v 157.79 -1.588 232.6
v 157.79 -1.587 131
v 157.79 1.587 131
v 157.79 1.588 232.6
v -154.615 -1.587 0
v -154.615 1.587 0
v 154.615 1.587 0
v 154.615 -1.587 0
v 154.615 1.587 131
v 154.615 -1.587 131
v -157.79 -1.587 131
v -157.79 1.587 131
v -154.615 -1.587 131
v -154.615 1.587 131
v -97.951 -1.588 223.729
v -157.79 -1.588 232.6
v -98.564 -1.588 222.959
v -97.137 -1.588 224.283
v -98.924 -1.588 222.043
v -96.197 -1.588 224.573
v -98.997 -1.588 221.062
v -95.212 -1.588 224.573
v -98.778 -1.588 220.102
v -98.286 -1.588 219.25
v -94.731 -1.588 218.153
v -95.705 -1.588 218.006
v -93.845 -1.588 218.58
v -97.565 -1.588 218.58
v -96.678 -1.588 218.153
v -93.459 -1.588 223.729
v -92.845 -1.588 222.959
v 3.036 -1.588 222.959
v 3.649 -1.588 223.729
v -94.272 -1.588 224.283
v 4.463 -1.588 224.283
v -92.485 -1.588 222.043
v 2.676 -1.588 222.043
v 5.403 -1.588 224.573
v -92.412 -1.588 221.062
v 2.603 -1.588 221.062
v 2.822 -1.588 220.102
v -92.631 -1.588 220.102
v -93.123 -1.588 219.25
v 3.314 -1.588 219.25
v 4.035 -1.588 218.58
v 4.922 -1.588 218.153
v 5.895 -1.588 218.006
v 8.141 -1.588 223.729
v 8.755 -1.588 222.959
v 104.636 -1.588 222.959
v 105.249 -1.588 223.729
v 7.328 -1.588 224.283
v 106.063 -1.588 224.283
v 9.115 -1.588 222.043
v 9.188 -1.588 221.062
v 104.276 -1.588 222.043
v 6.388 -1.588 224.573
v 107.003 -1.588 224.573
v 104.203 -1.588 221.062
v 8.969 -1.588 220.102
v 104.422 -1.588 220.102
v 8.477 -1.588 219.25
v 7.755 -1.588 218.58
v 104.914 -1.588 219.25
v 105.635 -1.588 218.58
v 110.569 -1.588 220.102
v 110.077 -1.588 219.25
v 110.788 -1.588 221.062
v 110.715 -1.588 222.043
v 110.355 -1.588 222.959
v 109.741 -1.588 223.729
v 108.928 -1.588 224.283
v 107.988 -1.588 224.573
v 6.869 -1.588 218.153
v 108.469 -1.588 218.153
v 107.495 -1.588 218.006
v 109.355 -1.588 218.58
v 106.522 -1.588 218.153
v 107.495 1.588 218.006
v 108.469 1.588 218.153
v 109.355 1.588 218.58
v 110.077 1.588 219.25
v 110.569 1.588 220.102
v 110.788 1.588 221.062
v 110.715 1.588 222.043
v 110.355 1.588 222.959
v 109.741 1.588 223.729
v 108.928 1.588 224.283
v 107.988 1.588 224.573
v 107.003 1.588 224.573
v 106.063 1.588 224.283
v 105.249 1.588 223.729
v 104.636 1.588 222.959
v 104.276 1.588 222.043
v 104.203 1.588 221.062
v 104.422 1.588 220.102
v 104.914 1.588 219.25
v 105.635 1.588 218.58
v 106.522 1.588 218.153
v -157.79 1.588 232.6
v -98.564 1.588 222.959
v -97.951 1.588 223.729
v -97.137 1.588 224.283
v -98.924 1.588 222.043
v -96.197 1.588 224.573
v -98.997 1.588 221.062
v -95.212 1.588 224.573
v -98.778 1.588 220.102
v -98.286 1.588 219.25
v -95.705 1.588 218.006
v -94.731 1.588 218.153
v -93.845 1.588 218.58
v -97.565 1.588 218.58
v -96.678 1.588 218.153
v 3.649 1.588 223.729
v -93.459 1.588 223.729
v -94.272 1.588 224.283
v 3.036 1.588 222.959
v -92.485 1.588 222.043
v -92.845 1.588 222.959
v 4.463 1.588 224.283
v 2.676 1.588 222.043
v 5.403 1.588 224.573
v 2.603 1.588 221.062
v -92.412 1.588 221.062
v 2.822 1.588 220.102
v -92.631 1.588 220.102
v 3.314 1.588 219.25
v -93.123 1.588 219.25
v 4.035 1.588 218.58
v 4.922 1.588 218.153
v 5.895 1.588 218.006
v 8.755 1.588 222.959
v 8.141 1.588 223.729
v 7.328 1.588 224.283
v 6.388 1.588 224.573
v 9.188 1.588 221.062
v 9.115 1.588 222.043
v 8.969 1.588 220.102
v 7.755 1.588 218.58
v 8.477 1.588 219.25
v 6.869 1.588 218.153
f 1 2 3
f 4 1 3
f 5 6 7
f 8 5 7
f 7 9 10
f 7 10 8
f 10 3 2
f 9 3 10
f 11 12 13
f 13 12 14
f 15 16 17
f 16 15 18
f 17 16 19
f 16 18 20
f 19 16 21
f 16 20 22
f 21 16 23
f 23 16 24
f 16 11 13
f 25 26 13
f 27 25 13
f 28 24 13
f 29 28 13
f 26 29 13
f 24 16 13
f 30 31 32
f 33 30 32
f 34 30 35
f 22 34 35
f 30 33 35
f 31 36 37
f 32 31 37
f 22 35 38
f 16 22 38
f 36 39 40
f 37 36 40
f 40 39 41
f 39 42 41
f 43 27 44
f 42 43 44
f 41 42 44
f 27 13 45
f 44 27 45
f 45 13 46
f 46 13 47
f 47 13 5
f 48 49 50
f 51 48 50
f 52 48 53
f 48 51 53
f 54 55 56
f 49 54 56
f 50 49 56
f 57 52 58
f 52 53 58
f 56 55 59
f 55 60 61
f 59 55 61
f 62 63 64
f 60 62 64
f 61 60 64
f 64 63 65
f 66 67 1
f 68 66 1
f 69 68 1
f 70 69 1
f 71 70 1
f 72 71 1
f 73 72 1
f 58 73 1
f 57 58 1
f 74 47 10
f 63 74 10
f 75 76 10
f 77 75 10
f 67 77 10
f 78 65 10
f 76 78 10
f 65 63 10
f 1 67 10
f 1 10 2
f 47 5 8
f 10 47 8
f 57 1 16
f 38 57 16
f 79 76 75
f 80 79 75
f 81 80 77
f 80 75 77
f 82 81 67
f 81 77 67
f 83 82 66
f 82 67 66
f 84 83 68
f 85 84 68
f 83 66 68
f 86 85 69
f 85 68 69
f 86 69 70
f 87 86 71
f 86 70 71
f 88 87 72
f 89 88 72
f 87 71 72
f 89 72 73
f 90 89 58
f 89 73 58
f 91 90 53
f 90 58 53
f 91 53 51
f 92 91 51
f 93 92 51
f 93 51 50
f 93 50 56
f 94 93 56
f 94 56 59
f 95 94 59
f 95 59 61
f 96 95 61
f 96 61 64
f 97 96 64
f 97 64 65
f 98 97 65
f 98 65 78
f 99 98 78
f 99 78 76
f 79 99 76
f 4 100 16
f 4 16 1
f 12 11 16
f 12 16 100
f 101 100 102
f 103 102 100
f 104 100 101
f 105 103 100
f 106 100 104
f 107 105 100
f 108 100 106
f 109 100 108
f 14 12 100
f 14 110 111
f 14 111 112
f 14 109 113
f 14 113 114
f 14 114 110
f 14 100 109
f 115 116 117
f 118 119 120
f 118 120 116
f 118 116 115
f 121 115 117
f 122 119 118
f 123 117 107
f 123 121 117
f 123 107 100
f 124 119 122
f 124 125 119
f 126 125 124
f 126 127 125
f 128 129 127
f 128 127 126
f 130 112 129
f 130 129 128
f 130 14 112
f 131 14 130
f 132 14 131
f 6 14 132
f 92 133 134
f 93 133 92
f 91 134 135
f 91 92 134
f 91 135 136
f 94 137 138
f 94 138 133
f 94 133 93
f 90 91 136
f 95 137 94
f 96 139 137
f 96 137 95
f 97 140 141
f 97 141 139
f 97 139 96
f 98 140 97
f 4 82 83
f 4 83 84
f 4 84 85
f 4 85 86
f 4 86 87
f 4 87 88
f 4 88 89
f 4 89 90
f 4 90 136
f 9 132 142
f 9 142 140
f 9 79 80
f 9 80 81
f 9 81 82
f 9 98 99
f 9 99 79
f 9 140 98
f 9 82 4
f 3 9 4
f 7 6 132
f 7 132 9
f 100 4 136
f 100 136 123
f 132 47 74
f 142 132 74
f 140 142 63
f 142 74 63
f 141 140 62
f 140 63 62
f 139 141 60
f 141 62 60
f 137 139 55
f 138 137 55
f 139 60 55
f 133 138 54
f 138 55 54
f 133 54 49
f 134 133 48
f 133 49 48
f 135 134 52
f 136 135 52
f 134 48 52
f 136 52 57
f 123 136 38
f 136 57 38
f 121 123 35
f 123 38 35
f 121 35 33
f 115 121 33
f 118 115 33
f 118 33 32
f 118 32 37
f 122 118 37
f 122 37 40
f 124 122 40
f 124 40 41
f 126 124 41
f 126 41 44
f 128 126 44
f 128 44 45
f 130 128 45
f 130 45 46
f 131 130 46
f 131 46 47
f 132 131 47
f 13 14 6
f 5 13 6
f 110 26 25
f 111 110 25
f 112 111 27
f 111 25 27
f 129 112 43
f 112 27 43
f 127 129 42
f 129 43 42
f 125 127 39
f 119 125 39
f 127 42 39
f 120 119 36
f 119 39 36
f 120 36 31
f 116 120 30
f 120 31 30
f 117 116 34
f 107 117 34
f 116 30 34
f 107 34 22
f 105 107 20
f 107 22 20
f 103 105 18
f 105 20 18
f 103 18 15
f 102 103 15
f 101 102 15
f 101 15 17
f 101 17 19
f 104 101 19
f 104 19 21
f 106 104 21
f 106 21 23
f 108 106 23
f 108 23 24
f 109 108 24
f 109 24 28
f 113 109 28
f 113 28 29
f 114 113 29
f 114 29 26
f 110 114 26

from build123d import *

# Parameters (mm, degrees)
SKETCH1_W           = 315.58
SKETCH1_H           = 3.175
BOSS_EXTRUDE1_DEPTH = 232.600000128
SKETCH5_W           = 3.175
SKETCH5_H           = 130.999992
CUT_EXTRUDE2_DEPTH  = 282.088108579
SKETCH7_R           = 3.302
CUT_EXTRUDE3_DEPTH  = 282.088108579
LPATTERN1_COUNT     = 3
LPATTERN1_PITCH     = 101.6


with BuildPart() as part:
    # Sketch1 → Boss-Extrude1 (new body)
    with BuildSketch(Plane.XY):
        Rectangle(SKETCH1_W, SKETCH1_H)
    extrude(amount=BOSS_EXTRUDE1_DEPTH)

    # Sketch5 → Cut-Extrude2 (cut, symmetric)
    with BuildSketch(Plane(origin=(0, 1.5875, 0), x_dir=(1, 0, 0), z_dir=(0, 1, 0))):
        with Locations((-156.2025, -65.499996)):
            Rectangle(SKETCH5_W, SKETCH5_H)
    cut_extrude2 = extrude(amount=CUT_EXTRUDE2_DEPTH, both=True, mode=Mode.SUBTRACT)

    # Mirror1: Cut-Extrude2 across plane
    add(cut_extrude2.mirror(Plane(origin=(0, 0, 0), x_dir=(0, 0, 1), z_dir=(1, 0, 0))), mode=Mode.SUBTRACT)

    # Sketch7 → Cut-Extrude3 (cut, through all)
    with BuildSketch(Plane.XZ.offset(1.5875)):
        with Locations(Location((107.495393219, 221.30835, 0), (0, 0, 270))):
            Circle(SKETCH7_R)
    cut_extrude3 = extrude(amount=-CUT_EXTRUDE3_DEPTH, mode=Mode.SUBTRACT)

    # LPattern1: Cut-Extrude3 ×3
    with Locations(*[(-i * LPATTERN1_PITCH, 0, 0) for i in range(1, LPATTERN1_COUNT)]):
        add(cut_extrude3, mode=Mode.SUBTRACT)


solid = part.part
